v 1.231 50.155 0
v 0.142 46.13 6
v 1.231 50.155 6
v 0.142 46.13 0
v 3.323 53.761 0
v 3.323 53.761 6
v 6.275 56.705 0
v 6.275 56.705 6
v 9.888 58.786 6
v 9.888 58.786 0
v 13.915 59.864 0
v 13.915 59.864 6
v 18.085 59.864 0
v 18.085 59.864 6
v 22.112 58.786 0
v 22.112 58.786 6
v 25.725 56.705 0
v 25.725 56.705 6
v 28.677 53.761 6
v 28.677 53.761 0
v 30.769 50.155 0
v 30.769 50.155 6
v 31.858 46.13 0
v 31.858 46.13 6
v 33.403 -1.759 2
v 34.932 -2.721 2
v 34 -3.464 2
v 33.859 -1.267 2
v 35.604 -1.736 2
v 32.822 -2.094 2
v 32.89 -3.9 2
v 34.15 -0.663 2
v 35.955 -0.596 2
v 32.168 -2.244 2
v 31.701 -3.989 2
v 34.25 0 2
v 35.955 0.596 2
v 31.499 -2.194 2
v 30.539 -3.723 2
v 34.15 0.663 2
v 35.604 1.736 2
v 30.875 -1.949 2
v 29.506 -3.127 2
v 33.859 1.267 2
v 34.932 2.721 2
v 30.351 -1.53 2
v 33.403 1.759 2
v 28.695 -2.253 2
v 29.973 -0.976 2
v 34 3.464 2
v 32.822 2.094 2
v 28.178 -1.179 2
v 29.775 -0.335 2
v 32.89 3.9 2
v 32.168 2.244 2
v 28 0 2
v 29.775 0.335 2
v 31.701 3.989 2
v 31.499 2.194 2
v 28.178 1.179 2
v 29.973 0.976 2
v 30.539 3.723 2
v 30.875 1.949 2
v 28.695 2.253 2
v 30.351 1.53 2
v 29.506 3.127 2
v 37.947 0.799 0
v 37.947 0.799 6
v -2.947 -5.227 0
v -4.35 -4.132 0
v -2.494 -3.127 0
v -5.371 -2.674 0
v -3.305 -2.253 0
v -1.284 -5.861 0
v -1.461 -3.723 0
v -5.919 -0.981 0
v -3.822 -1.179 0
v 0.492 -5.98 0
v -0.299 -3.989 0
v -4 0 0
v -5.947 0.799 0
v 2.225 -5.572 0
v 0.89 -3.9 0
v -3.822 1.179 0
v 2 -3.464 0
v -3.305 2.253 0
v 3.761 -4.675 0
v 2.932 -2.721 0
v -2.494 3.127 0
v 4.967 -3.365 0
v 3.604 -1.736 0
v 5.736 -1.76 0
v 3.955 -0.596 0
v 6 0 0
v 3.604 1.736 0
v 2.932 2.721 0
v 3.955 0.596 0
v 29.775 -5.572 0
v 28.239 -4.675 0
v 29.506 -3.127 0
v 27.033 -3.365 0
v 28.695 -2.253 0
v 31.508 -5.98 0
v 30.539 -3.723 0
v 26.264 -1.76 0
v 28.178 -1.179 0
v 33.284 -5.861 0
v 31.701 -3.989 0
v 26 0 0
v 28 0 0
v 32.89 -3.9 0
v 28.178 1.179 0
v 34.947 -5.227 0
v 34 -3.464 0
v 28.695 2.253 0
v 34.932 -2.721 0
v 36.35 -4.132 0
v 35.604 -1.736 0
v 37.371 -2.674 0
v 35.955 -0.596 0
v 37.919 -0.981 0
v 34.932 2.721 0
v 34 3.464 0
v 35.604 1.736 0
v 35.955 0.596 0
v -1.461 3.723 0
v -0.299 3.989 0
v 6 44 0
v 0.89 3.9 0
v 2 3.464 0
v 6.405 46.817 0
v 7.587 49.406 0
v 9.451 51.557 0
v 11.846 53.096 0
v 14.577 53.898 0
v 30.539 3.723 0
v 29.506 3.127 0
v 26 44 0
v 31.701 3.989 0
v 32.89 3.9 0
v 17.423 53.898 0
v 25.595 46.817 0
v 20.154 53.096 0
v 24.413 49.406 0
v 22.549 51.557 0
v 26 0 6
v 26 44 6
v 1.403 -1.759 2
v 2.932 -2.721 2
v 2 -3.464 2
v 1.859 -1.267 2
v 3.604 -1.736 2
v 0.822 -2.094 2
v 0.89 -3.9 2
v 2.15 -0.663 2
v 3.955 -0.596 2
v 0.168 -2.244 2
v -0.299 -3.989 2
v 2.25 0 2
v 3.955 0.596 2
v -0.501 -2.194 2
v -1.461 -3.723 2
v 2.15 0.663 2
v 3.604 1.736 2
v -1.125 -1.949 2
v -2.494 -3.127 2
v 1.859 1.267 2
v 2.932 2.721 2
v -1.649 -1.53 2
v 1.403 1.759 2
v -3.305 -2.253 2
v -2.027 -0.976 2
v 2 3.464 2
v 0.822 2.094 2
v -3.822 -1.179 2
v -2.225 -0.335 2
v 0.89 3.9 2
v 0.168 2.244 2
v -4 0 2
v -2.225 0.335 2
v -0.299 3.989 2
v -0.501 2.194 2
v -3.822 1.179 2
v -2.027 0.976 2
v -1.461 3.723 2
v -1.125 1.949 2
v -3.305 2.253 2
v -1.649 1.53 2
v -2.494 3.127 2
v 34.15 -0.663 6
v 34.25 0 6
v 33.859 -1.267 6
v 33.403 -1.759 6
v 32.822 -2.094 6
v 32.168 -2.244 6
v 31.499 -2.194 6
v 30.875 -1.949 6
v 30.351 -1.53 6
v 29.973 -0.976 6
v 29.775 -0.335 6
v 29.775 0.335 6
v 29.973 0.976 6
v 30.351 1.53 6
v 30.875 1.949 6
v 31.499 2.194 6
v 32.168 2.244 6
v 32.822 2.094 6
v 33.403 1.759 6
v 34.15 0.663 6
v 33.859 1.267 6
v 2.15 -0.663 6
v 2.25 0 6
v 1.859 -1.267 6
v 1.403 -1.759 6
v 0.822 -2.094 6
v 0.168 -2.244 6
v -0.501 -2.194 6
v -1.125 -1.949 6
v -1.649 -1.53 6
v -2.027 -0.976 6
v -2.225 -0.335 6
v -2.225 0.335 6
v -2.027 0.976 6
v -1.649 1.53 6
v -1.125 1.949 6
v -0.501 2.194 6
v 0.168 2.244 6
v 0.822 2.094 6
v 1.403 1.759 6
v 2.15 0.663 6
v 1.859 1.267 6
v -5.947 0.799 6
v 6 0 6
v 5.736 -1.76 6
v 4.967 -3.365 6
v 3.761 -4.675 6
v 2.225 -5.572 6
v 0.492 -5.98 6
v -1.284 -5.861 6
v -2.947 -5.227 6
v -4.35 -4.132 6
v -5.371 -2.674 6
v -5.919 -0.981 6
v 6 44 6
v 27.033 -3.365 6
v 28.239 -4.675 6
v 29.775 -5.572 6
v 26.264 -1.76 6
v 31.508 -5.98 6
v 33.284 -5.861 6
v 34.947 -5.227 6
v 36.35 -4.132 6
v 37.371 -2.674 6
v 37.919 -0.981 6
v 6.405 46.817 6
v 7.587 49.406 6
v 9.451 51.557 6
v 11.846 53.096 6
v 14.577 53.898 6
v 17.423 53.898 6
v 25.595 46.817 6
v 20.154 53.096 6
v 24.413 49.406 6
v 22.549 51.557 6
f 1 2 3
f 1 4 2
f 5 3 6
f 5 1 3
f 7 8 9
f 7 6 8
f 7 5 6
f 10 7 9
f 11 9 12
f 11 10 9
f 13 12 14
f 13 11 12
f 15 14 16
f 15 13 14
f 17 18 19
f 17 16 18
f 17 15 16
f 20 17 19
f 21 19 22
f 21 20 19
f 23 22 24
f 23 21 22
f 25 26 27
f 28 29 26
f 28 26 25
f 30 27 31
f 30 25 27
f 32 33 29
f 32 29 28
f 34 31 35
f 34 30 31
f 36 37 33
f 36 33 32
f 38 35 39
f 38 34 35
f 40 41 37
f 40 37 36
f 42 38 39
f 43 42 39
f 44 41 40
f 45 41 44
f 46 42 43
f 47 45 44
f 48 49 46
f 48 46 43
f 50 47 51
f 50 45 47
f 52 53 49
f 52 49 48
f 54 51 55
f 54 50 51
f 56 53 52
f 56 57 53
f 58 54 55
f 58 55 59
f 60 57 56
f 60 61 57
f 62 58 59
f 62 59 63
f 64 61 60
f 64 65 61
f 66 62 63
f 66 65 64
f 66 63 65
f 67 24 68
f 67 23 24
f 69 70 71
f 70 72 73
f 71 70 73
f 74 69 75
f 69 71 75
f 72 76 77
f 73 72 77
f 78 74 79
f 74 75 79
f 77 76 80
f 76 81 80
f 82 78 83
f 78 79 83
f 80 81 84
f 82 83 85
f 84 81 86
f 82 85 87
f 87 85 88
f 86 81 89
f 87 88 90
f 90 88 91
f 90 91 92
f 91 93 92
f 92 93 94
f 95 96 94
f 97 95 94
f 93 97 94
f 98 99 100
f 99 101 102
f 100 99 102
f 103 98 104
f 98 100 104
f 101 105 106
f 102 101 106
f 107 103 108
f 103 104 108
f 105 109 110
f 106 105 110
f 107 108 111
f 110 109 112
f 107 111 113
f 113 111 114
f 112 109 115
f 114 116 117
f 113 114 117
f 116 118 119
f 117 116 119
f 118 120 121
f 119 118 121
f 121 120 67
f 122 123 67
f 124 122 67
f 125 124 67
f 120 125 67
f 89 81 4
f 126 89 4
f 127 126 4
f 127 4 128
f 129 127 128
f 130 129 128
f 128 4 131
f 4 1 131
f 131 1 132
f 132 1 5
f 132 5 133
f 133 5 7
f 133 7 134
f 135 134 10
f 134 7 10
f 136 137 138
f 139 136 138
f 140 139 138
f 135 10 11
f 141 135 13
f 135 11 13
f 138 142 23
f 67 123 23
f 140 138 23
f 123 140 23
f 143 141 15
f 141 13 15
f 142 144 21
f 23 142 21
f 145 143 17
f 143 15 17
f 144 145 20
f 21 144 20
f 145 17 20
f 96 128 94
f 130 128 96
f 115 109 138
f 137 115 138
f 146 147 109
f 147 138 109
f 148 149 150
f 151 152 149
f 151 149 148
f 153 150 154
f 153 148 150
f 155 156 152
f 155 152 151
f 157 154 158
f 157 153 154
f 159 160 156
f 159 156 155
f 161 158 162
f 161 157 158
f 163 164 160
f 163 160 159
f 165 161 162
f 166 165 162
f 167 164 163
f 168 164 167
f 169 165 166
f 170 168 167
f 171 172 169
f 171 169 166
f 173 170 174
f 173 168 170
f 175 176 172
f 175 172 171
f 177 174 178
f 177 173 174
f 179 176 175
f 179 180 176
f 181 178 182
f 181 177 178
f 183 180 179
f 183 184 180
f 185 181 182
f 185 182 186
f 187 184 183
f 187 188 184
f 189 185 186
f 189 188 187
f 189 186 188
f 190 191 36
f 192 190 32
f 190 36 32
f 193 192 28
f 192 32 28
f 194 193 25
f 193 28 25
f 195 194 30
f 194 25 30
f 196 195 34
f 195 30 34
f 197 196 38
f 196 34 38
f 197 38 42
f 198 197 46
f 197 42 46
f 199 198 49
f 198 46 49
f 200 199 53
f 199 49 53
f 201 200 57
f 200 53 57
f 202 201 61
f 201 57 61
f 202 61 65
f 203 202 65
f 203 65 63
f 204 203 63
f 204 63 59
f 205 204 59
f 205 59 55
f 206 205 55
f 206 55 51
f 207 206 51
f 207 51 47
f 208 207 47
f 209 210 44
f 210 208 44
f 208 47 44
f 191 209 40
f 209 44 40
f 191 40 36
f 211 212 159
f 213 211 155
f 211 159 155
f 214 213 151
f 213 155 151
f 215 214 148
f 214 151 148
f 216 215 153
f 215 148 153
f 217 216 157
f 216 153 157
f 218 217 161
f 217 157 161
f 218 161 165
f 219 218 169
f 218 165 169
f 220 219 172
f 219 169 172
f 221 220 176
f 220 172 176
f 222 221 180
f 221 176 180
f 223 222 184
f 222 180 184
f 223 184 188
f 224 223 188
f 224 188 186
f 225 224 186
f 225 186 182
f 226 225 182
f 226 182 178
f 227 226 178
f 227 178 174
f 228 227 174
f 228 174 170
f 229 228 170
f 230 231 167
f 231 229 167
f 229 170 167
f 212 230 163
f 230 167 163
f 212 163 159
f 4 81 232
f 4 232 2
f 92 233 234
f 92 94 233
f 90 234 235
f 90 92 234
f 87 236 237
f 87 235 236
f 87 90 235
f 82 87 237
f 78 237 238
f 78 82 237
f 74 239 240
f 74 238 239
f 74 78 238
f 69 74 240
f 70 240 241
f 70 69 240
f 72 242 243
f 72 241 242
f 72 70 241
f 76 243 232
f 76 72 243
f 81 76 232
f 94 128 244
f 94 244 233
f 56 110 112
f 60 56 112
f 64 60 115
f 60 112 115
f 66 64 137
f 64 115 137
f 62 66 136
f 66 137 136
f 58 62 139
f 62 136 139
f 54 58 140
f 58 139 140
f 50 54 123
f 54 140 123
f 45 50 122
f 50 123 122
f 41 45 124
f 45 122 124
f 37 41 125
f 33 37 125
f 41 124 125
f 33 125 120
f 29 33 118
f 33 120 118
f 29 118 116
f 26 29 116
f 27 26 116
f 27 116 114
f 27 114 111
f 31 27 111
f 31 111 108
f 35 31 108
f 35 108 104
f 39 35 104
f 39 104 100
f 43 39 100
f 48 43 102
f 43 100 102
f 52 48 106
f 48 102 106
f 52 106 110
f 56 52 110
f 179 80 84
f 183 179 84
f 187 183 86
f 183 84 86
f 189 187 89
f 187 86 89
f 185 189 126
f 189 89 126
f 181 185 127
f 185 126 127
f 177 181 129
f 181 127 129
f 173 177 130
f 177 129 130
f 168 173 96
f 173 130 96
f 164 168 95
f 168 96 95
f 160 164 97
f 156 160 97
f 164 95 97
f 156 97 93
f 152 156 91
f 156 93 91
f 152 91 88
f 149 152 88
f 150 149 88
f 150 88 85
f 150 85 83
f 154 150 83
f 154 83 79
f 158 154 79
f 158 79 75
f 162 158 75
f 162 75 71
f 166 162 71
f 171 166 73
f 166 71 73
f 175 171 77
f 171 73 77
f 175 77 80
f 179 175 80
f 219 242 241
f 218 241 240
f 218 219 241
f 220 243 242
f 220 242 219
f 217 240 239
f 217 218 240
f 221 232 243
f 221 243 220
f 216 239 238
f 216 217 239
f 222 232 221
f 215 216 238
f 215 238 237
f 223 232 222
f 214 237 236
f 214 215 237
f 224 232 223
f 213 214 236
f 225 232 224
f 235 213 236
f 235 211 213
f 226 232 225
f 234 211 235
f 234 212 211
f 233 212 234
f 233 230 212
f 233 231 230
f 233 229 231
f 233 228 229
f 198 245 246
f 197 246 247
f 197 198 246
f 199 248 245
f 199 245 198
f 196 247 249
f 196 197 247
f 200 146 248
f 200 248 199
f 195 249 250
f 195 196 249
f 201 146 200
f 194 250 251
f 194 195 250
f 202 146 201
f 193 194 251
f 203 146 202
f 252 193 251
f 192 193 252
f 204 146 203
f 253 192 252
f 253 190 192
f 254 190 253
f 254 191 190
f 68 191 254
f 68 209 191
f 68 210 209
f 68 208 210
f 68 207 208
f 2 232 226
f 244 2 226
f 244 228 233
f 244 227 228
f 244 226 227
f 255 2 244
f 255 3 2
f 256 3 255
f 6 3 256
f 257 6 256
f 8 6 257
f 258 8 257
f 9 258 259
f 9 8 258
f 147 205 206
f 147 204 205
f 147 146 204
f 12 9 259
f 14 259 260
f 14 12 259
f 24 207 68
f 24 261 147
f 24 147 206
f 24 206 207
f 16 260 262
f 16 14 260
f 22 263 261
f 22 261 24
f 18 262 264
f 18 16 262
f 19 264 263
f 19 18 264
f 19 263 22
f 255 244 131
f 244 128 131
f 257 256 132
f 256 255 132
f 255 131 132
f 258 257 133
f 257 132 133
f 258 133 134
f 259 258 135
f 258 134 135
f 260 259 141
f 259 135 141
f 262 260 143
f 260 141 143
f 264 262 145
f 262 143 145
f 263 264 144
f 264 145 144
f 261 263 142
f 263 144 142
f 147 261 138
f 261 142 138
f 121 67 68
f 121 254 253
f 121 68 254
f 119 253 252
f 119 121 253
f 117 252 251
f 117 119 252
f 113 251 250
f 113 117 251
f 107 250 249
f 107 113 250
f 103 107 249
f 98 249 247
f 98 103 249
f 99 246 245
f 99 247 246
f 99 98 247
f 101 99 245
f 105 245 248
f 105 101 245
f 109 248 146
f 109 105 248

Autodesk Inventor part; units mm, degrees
sketch "スケッチ1" plane through (0, 0, 0) normal (0, 0, 1) x (1, 0, 0)
  line L0 (0, 0) -> (32, 0) construction
  line L1 (0, 60) -> (36, 60) construction
  circle A0 centre (0, 0) radius 2.25
  circle A1 centre (32, 0) radius 2.25
  circle A2 centre (16, 44) radius 10
  circle A3 centre (0, 0) radius 6
  circle A4 centre (32, 0) radius 6
  line L2 (6, 44) -> (6, 0)
  line L3 (26, 44) -> (26, 0)
  line L4 (-5.9466, 0.7988) -> (0.1424, 46.13)
  arc A5 (31.8576, 46.13) -> (0.1424, 46.13) centre (16, 44) ccw
  line L5 (31.8576, 46.13) -> (37.9466, 0.7988)
  point P0 (16, 0)
  dimension "d4" = 4.5
  dimension "d11" = 32
  dimension "d12" = 12
  dimension "d14" = 60
  dimension "d15" = 20
  dimension "d16" = 6
extrude "押し出し1" add sketch "スケッチ1" along normal blind 6 contours A2 L2 A3 L4 A5 L5 A4 L3 | A4 | A3
sketch "スケッチ4" plane through (0, 0, 0) normal (0, 0, -1) x (-1, 0, 0)
  circle A0 centre (-32, 0) radius 2.25 construction
  circle A1 centre (0, 0) radius 2.25 construction
  circle A2 centre (-32, 0) radius 4
  circle A3 centre (0, 0) radius 4
  dimension "d17" = 8
extrude "押し出し3" cut sketch "スケッチ4" against normal blind 2
properties part number "gpu_cable_holder"
